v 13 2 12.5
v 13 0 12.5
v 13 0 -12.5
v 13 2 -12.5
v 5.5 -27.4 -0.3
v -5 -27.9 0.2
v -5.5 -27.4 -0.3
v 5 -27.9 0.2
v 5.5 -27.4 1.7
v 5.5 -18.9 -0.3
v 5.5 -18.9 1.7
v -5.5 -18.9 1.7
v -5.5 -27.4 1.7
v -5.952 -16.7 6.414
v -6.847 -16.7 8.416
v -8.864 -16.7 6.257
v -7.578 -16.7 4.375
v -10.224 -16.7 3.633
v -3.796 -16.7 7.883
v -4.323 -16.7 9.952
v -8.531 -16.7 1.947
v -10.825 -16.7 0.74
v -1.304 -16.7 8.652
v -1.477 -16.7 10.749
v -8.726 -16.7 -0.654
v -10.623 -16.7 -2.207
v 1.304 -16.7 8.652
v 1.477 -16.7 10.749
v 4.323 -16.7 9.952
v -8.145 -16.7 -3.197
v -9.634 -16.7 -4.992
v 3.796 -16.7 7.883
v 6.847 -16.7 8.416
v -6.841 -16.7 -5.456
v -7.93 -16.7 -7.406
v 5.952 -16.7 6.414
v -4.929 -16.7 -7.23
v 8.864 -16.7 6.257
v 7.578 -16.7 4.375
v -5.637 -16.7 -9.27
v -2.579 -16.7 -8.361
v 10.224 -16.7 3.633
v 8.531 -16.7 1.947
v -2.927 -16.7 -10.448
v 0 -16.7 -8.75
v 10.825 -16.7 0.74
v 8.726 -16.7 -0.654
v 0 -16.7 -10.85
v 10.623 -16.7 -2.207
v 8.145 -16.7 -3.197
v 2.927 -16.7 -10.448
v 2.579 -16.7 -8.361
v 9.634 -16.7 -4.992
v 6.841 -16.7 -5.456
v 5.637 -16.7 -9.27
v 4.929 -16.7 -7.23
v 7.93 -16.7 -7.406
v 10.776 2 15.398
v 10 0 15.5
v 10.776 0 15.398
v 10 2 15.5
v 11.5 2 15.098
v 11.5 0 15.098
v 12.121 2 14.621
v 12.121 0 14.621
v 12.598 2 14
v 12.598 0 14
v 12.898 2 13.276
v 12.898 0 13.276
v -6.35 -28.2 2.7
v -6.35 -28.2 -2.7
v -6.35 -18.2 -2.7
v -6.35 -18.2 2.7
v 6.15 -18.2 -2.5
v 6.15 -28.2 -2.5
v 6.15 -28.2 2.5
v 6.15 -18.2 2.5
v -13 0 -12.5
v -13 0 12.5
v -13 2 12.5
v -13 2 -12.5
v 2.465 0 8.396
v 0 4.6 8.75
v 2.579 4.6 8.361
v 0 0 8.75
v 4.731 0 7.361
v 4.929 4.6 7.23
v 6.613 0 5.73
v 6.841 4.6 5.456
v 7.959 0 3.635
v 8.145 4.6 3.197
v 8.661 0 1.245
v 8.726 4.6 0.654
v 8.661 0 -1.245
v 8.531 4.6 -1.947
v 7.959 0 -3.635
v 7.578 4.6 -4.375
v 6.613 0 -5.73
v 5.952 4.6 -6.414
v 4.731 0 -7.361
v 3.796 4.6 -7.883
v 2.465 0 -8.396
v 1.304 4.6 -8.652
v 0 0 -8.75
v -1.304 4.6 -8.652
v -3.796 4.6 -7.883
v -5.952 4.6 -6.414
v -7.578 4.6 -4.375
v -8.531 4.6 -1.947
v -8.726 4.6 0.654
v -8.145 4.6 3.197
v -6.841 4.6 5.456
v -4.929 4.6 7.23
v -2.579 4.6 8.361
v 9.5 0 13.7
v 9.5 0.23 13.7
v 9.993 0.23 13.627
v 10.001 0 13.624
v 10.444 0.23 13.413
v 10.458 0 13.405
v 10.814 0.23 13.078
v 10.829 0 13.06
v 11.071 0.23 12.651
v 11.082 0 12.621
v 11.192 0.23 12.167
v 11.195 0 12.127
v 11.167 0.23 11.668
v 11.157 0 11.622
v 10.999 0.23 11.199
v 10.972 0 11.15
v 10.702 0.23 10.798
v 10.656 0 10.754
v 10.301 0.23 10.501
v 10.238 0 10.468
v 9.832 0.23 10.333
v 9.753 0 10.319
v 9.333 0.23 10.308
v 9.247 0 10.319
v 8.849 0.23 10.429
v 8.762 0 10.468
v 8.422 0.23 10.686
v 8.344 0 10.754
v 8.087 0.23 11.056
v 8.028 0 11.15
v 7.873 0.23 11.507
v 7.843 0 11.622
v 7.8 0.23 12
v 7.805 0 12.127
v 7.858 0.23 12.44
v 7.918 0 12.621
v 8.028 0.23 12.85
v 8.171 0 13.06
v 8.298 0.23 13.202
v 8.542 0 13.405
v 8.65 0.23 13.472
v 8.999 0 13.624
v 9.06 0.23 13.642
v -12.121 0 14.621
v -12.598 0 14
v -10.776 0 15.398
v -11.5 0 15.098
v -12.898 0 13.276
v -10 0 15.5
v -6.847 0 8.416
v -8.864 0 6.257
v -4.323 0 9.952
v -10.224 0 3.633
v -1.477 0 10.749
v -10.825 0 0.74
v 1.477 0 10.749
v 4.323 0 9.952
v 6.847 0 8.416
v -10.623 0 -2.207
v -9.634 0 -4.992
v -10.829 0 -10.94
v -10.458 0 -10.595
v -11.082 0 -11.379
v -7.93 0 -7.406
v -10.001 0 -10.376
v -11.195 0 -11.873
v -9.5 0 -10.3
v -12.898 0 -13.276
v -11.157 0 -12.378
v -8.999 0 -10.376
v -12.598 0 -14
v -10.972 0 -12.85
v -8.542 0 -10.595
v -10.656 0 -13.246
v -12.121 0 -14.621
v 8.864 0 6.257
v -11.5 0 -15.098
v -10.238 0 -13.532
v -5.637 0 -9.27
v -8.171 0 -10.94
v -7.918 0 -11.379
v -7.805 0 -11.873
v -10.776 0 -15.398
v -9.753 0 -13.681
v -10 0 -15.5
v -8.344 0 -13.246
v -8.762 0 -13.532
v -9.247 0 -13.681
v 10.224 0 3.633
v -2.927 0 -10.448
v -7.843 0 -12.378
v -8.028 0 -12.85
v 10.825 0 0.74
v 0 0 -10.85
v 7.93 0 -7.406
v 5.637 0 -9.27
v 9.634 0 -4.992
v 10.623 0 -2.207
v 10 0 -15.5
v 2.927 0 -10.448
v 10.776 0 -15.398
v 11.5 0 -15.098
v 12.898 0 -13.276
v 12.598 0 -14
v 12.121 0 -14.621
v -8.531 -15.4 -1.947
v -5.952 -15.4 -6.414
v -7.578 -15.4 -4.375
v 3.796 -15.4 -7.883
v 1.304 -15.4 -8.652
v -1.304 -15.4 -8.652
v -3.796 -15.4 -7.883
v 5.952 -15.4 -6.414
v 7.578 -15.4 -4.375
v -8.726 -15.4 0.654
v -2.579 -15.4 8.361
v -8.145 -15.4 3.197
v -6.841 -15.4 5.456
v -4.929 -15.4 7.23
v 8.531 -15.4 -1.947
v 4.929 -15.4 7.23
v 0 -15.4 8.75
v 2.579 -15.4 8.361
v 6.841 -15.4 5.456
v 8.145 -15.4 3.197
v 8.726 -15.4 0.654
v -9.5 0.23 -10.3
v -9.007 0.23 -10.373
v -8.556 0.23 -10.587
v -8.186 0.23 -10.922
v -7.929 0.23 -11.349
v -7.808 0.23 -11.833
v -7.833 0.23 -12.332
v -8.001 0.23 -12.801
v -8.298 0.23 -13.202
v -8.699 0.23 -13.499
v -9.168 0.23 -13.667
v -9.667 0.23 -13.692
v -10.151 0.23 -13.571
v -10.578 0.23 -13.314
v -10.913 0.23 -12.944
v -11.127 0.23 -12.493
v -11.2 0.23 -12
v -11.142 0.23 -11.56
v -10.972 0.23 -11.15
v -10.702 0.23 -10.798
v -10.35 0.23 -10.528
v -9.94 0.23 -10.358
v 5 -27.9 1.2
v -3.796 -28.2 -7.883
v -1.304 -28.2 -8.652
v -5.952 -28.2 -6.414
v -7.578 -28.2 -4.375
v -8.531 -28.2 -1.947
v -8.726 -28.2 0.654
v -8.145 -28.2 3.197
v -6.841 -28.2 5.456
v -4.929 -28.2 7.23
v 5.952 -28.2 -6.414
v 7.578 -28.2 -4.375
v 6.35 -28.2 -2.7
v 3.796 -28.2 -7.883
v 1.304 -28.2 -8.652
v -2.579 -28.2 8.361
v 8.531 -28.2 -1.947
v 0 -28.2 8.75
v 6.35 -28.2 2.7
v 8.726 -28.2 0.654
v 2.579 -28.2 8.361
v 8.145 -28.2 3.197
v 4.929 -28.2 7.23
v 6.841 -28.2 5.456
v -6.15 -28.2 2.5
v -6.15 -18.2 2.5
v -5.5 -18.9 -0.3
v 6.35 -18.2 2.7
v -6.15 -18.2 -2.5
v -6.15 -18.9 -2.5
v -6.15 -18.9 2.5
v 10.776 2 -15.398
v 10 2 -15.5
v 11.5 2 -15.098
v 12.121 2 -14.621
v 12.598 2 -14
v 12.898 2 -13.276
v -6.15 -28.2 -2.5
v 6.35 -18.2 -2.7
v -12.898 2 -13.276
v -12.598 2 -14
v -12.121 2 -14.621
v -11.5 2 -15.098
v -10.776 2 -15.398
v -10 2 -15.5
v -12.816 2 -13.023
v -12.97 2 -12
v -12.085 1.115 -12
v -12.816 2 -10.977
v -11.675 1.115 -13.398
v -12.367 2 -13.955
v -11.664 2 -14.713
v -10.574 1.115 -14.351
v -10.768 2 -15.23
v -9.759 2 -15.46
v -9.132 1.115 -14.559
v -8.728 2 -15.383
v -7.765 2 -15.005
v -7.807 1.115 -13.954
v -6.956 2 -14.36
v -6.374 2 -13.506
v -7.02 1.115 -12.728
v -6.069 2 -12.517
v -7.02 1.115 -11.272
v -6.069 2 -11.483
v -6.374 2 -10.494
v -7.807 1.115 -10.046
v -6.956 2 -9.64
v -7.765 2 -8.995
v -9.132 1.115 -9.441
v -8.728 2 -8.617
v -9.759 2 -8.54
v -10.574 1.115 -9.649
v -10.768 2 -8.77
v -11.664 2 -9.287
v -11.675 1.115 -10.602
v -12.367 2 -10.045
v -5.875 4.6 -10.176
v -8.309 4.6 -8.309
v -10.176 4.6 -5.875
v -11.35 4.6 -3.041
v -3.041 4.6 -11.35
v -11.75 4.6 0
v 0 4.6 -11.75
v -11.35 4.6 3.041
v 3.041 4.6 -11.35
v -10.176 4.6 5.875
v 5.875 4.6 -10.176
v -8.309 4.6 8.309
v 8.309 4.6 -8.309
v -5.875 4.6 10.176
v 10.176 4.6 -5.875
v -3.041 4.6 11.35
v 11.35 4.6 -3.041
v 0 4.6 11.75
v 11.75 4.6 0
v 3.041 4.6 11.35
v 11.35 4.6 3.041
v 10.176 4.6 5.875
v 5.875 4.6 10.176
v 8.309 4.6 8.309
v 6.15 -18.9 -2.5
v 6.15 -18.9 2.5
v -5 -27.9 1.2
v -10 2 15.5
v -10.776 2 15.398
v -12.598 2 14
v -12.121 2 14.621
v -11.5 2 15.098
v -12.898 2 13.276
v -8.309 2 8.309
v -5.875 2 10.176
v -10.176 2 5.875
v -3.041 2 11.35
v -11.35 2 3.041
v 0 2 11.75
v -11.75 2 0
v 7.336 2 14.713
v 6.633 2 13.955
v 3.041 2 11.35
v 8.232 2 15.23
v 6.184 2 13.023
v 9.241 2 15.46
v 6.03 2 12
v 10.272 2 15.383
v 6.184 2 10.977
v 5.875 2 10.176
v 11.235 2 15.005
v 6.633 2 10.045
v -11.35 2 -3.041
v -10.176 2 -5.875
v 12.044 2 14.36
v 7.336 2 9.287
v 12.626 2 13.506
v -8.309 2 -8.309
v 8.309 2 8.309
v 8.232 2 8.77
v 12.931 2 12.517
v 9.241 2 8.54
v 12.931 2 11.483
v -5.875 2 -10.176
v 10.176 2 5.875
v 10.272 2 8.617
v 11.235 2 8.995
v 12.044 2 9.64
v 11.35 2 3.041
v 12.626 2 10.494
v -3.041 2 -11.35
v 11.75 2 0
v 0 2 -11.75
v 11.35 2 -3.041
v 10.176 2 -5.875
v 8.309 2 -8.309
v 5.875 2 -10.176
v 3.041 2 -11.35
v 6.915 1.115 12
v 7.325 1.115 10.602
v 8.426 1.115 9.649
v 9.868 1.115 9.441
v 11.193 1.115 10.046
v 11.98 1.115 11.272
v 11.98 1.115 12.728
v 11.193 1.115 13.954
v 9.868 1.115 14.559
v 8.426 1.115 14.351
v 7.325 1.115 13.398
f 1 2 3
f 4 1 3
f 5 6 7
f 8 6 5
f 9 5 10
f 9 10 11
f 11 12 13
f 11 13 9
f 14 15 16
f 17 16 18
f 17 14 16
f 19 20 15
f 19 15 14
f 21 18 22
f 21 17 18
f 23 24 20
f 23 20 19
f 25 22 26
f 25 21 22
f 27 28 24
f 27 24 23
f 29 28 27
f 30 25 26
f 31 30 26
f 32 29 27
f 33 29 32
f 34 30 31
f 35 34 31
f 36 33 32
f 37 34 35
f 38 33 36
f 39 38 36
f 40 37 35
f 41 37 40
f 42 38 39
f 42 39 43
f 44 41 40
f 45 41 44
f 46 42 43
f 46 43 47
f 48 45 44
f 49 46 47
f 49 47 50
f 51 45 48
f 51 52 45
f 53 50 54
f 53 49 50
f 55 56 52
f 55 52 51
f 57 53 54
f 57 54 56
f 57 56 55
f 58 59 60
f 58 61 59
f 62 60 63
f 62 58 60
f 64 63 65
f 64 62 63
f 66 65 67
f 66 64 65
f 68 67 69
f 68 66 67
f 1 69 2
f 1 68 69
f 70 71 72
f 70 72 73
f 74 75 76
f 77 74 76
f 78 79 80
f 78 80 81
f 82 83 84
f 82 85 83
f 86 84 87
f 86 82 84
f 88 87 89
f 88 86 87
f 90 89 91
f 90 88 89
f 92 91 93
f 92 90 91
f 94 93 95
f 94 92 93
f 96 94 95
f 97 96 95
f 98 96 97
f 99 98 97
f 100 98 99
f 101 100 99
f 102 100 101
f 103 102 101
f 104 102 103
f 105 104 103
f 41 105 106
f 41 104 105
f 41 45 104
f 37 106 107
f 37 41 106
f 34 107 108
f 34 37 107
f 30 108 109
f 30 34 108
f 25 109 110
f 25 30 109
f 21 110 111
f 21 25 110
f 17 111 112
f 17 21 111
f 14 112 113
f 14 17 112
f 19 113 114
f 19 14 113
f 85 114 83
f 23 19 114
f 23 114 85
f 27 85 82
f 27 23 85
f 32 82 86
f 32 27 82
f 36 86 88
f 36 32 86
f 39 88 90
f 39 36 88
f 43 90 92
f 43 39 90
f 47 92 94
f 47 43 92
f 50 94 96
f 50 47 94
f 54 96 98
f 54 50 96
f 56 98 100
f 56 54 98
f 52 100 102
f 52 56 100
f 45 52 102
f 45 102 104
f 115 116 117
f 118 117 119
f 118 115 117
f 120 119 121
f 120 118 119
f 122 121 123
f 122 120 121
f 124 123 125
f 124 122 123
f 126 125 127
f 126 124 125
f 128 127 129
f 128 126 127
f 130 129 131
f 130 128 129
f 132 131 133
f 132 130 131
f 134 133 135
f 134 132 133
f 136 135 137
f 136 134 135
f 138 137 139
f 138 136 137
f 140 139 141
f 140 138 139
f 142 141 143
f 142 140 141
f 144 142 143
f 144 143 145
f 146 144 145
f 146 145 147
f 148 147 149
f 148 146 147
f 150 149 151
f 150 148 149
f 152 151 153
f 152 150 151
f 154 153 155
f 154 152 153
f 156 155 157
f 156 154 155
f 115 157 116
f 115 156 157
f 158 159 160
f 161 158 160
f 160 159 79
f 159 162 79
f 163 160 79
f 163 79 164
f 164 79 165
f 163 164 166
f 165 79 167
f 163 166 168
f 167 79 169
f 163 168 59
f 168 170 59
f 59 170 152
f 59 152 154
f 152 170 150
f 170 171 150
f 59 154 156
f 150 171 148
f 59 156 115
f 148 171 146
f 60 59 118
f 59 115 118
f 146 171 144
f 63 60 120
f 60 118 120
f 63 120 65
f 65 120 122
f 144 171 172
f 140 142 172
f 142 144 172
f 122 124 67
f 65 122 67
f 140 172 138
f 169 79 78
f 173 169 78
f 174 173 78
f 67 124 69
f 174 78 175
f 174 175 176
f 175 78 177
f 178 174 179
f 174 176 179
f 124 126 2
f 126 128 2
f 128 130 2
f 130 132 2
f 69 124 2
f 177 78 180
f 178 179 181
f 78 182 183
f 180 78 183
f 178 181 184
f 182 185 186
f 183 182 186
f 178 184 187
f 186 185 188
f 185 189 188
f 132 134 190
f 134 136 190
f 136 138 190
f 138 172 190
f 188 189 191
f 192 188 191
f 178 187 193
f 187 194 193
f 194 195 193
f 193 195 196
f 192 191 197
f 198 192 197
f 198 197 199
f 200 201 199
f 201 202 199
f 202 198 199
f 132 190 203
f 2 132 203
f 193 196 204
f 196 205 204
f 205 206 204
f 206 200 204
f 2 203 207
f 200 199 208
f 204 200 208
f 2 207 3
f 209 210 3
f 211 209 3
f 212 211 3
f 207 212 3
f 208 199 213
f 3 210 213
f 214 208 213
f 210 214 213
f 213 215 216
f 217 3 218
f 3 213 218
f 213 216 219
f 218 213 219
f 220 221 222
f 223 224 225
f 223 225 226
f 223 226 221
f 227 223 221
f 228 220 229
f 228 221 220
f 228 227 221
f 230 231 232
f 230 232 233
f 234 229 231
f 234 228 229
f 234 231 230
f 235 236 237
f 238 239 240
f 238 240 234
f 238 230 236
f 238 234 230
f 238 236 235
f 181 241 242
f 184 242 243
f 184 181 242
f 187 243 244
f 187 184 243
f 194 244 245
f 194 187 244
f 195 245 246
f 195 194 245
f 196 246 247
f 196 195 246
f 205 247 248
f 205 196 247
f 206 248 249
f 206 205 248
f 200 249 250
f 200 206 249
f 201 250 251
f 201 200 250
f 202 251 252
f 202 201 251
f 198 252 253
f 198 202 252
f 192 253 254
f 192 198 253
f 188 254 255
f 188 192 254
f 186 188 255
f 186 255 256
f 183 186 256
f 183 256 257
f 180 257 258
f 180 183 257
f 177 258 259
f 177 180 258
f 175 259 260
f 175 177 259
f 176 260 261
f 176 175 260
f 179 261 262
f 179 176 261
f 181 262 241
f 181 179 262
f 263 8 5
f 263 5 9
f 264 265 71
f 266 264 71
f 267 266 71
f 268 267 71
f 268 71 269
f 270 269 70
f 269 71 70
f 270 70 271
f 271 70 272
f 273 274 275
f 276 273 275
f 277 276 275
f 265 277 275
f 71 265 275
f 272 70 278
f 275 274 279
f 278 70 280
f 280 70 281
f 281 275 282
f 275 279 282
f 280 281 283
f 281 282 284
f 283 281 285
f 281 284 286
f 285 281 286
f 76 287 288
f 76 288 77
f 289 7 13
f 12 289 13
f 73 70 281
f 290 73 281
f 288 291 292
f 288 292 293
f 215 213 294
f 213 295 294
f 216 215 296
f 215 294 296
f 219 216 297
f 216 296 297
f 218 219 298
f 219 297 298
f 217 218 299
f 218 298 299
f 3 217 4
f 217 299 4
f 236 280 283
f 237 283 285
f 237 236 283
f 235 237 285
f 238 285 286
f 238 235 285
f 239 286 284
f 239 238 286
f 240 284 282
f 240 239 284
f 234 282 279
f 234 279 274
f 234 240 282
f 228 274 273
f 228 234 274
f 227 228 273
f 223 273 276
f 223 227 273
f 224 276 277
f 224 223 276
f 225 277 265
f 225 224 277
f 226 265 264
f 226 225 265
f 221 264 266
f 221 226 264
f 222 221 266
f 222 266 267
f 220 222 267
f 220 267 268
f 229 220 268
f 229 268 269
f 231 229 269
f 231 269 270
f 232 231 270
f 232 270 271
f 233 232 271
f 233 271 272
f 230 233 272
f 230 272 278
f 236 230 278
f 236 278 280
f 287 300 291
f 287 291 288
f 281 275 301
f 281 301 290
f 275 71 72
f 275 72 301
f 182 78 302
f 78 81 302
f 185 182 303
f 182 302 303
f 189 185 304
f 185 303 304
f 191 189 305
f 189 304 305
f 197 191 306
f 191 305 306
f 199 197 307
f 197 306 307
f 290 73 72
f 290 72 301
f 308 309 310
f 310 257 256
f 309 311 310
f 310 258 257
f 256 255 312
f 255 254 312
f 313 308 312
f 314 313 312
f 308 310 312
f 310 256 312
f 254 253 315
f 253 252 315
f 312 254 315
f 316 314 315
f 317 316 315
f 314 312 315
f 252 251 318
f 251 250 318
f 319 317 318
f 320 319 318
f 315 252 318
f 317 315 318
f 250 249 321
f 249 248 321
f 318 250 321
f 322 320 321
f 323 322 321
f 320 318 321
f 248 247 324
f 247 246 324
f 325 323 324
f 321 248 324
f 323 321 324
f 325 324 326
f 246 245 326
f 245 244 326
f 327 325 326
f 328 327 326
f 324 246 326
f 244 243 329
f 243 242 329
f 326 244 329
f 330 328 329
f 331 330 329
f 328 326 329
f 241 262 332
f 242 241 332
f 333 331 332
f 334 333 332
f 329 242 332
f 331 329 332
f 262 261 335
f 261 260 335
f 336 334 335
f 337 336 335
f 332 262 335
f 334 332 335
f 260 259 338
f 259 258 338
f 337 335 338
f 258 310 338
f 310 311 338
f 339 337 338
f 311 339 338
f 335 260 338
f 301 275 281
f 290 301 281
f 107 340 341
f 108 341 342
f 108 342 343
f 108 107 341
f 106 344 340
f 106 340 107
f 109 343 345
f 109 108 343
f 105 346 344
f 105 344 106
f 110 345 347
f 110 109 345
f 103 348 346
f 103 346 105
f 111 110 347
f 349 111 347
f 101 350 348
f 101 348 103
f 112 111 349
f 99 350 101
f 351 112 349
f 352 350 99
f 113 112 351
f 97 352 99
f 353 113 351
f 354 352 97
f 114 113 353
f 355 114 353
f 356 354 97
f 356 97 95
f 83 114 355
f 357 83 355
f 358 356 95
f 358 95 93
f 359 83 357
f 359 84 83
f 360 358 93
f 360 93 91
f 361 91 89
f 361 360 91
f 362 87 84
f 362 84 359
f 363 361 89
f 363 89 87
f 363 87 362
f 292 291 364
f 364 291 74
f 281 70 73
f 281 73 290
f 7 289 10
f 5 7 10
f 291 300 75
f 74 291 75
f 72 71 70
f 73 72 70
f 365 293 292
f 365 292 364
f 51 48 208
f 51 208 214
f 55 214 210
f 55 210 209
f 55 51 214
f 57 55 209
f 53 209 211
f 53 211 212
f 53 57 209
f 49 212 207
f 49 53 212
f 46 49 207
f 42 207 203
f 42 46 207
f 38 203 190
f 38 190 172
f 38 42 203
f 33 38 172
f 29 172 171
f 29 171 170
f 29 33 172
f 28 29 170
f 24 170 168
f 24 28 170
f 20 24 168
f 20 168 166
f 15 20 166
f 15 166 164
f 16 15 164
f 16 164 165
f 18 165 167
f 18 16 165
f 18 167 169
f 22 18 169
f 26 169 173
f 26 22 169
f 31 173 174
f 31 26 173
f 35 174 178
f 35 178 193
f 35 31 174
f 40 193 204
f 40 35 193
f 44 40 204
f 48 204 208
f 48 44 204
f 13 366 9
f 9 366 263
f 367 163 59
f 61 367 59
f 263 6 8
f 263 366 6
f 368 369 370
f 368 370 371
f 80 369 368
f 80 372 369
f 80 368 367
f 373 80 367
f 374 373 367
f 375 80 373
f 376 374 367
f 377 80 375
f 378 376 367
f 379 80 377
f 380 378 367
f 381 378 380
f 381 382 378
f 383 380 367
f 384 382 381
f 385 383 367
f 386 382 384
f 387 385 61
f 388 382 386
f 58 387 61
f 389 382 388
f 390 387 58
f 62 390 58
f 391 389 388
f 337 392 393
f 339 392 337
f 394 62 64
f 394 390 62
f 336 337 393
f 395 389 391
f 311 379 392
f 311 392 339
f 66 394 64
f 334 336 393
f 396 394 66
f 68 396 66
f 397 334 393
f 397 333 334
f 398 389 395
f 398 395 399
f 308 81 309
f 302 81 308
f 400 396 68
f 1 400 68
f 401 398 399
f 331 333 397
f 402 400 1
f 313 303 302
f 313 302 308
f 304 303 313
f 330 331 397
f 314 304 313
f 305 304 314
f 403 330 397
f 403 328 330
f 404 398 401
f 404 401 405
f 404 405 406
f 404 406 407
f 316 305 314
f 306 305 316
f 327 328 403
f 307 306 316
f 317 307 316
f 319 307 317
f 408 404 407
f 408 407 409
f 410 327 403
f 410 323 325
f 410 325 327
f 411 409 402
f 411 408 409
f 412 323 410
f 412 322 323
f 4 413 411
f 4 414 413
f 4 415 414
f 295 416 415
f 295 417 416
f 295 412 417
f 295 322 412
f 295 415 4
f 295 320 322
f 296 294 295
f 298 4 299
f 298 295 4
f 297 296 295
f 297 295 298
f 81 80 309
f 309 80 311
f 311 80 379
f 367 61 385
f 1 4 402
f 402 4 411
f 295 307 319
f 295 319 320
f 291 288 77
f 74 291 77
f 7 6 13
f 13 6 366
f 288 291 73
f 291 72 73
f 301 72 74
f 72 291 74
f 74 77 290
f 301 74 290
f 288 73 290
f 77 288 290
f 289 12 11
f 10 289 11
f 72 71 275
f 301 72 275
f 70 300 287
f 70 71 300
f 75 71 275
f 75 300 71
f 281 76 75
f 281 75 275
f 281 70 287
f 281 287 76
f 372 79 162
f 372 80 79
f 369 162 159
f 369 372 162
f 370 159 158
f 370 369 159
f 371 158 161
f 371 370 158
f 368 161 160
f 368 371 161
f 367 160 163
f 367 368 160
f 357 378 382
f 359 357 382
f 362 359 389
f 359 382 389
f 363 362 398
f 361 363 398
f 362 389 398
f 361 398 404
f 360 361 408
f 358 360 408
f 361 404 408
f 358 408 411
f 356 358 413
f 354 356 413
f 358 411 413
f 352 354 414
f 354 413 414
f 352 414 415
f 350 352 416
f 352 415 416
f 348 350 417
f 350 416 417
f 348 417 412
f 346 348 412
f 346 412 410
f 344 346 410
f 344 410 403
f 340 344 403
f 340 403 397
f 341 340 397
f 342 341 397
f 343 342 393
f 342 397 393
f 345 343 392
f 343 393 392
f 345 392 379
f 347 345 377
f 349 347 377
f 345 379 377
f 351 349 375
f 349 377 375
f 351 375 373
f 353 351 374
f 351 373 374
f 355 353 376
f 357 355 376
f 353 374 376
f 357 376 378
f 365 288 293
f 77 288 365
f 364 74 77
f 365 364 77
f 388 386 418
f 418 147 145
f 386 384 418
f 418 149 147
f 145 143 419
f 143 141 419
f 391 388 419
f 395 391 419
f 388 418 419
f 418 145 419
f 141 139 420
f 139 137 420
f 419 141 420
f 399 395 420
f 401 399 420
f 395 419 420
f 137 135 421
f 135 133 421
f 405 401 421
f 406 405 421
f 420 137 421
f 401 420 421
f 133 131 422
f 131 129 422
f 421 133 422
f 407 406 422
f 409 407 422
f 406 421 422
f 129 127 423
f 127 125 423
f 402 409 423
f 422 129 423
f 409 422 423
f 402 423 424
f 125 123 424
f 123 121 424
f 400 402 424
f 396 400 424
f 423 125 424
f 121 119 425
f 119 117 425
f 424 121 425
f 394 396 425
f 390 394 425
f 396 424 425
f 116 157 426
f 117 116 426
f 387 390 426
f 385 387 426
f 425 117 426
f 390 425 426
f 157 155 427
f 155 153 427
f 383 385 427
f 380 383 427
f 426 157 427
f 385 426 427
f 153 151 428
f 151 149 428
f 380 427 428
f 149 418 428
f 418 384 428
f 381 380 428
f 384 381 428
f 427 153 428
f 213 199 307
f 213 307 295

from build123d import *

# Parameters (mm, degrees)
CROQUIS1_W                                           = 26
CROQUIS1_H                                           = 31
CROQUIS1_R                                           = 8.75
CROQUIS1_R_2                                         = 1.7
SALIENTE_EXTRUIR1_DEPTH                              = 2
REDONDEO1_R                                          = 3
CROQUIS2_R                                           = 11.75
CROQUIS2_R_2                                         = 8.75
SALIENTE_EXTRUIR2_DEPTH                              = 2.6
SALIENTE_EXTRUIR3_START                              = 16.7
CROQUIS3_R                                           = 10.85
CROQUIS3_R_2                                         = 8.75
SALIENTE_EXTRUIR3_DEPTH                              = 16.7
AVELLANADO_PARA_TORNILLOS_CON_CABEZA_AVE_D           = 3.4
AVELLANADO_PARA_TORNILLOS_CON_CABEZA_AVE_DEPTH       = 15
AVELLANADO_PARA_TORNILLOS_CON_CABEZA_AVE_CSINK_D     = 6.94
AVELLANADO_PARA_TORNILLOS_CON_CABEZA_AVE_CSINK_ANGLE = 90
AVELLANADO_PARA_TORNILLOS_CON_CABEZA_AVE_TIP         = 1.021463052
CROQUIS6_R                                           = 8.75
SALIENTE_EXTRUIR4_DEPTH                              = 32.8
CROQUIS7_W                                           = 12.7
CROQUIS7_H                                           = 5.4
CORTAR_EXTRUIR1_DEPTH                                = 10
CROQUIS8_W                                           = 12.7
CROQUIS8_H                                           = 5.4
CORTAR_EXTRUIR2_DEPTH                                = 10
CROQUIS9_W                                           = 12.7
CROQUIS9_H                                           = 5.4
CROQUIS9_W_2                                         = 12.3
CROQUIS9_H_2                                         = 5
SALIENTE_EXTRUIR5_DEPTH                              = 10
CROQUIS10_W                                          = 12.7
CROQUIS10_H                                          = 5.4
CROQUIS10_W_2                                        = 12.3
CROQUIS10_H_2                                        = 5
SALIENTE_EXTRUIR6_DEPTH                              = 10
CROQUIS11_W                                          = 12.3
CROQUIS11_H                                          = 5
SALIENTE_EXTRUIR7_DEPTH                              = 0.7
CROQUIS12_W                                          = 12.3
CROQUIS12_H                                          = 5
SALIENTE_EXTRUIR8_DEPTH                              = 0.7
CROQUIS13_W                                          = 11
CROQUIS13_H                                          = 2
SALIENTE_EXTRUIR9_DEPTH                              = 9
CROQUIS14_W                                          = 11
CROQUIS14_H                                          = 2
SALIENTE_EXTRUIR10_DEPTH                             = 9
CHAFL_N1_SIZE                                        = 0.5
CHAFL_N2_SIZE                                        = 0.5
CUT_EXTRUDE1_START                                   = -20
SKETCH1_R                                            = 8.75
CUT_EXTRUDE1_DEPTH                                   = 20


with BuildPart() as part:
    # Croquis1 → Saliente-Extruir1 (new body)
    with BuildSketch(Plane(origin=(0, 0, 0), x_dir=(1, 0, 0), z_dir=(0, 1, 0))):
        Rectangle(CROQUIS1_W, CROQUIS1_H)
        with Locations(Location((0, 0, 0), (0, 0, 270))):
            Circle(CROQUIS1_R, mode=Mode.SUBTRACT)
        with Locations(Location((-9.5, 12, 0), (0, 0, 270))):
            Circle(CROQUIS1_R_2, mode=Mode.SUBTRACT)
        with Locations(Location((9.5, -12, 0), (0, 0, 270))):
            Circle(CROQUIS1_R_2, mode=Mode.SUBTRACT)
    extrude(amount=SALIENTE_EXTRUIR1_DEPTH)

    # Redondeo1
    redondeo1_edges = [part.edges().sort_by_distance(p)[0] for p in [
        (13, 1, 15.5),
        (-13, 1, 15.5),
        (-13, 1, -15.5),
        (13, 1, -15.5),
    ]]
    fillet(redondeo1_edges, radius=REDONDEO1_R)

    # Croquis2 → Saliente-Extruir2 (add)
    with BuildSketch(Plane(origin=(0, 2, 0), x_dir=(1, 0, 0), z_dir=(0, 1, 0))):
        with Locations(Location((0, 0, 0), (0, 0, 270))):
            Circle(CROQUIS2_R)
        with Locations(Location((0, 0, 0), (0, 0, 270))):
            Circle(CROQUIS2_R_2, mode=Mode.SUBTRACT)
    extrude(amount=SALIENTE_EXTRUIR2_DEPTH)

    # Croquis3 → Saliente-Extruir3 (add)
    with BuildSketch(Plane.XZ.offset(SALIENTE_EXTRUIR3_START)):
        with Locations(Location((0, 0, 0), (0, 0, 270))):
            Circle(CROQUIS3_R)
        with Locations(Location((0, 0, 0), (0, 0, 270))):
            Circle(CROQUIS3_R_2, mode=Mode.SUBTRACT)
    extrude(amount=-SALIENTE_EXTRUIR3_DEPTH)

    # Avellanado para tornillos con cabeza avellanada de clavija de M31
    with Locations(Plane(origin=(0, 2, 0), x_dir=(1, 0, 0), z_dir=(0, 1, 0))):
        with Locations((9.5, -12), (-9.5, 12)):
            CounterSinkHole(AVELLANADO_PARA_TORNILLOS_CON_CABEZA_AVE_D / 2, AVELLANADO_PARA_TORNILLOS_CON_CABEZA_AVE_CSINK_D / 2, depth=AVELLANADO_PARA_TORNILLOS_CON_CABEZA_AVE_DEPTH, counter_sink_angle=AVELLANADO_PARA_TORNILLOS_CON_CABEZA_AVE_CSINK_ANGLE)
            with Locations((0, 0, -(AVELLANADO_PARA_TORNILLOS_CON_CABEZA_AVE_DEPTH + AVELLANADO_PARA_TORNILLOS_CON_CABEZA_AVE_TIP / 2))):  # 118° drill point
                Cone(0, AVELLANADO_PARA_TORNILLOS_CON_CABEZA_AVE_D / 2, AVELLANADO_PARA_TORNILLOS_CON_CABEZA_AVE_TIP, mode=Mode.SUBTRACT)


with BuildPart() as body_2:
    # Croquis6 → Saliente-Extruir4 (new body)
    with BuildSketch(Plane(origin=(0, 4.6, 0), x_dir=(1, 0, 0), z_dir=(0, 1, 0))):
        with Locations(Location((0, 0, 0), (0, 0, 270))):
            Circle(CROQUIS6_R)
    extrude(amount=-SALIENTE_EXTRUIR4_DEPTH)

    # Croquis7 → Cortar-Extruir1 (cut)
    with BuildSketch(Plane(origin=(0, 4.6, 0), x_dir=(1, 0, 0), z_dir=(0, 1, 0))):
        Rectangle(CROQUIS7_W, CROQUIS7_H)
    extrude(amount=-CORTAR_EXTRUIR1_DEPTH, mode=Mode.SUBTRACT)

    # Croquis8 → Cortar-Extruir2 (cut)
    with BuildSketch(Plane.XZ.offset(28.2)):
        Rectangle(CROQUIS8_W, CROQUIS8_H)
    extrude(amount=-CORTAR_EXTRUIR2_DEPTH, mode=Mode.SUBTRACT)


with BuildPart() as body_3:
    # Croquis9 → Saliente-Extruir5 (new body)
    with BuildSketch(Plane.XZ.offset(28.2)):
        Rectangle(CROQUIS9_W, CROQUIS9_H)
        Rectangle(CROQUIS9_W_2, CROQUIS9_H_2, mode=Mode.SUBTRACT)
    extrude(amount=-SALIENTE_EXTRUIR5_DEPTH)


with BuildPart() as body_4:
    # Croquis10 → Saliente-Extruir6 (new body)
    with BuildSketch(Plane(origin=(0, 4.6, 0), x_dir=(1, 0, 0), z_dir=(0, 1, 0))):
        Rectangle(CROQUIS10_W, CROQUIS10_H)
        Rectangle(CROQUIS10_W_2, CROQUIS10_H_2, mode=Mode.SUBTRACT)
    extrude(amount=-SALIENTE_EXTRUIR6_DEPTH)


with BuildPart() as body_5:
    # Croquis11 → Saliente-Extruir7 (new body)
    with BuildSketch(Plane(origin=(0, -5.4, 0), x_dir=(1, 0, 0), z_dir=(0, 1, 0))):
        Rectangle(CROQUIS11_W, CROQUIS11_H)
    extrude(amount=SALIENTE_EXTRUIR7_DEPTH)


with BuildPart() as body_6:
    # Croquis12 → Saliente-Extruir8 (new body)
    with BuildSketch(Plane.XZ.offset(18.2)):
        Rectangle(CROQUIS12_W, CROQUIS12_H)
    extrude(amount=SALIENTE_EXTRUIR8_DEPTH)


with BuildPart() as body_7:
    # Croquis13 → Saliente-Extruir9 (new body)
    with BuildSketch(Plane(origin=(0, -4.7, 0), x_dir=(1, 0, 0), z_dir=(0, 1, 0))):
        with Locations((0, -0.7)):
            Rectangle(CROQUIS13_W, CROQUIS13_H)
    extrude(amount=SALIENTE_EXTRUIR9_DEPTH)

    # Chaflán1
    chafl_n1_edges = [body_7.edges().sort_by_distance(p)[0] for p in [
        (-5.5, 4.3, 0.7),
        (0, 4.3, 1.7),
        (5.5, 4.3, 0.7),
        (0, 4.3, -0.3),
    ]]
    chamfer(chafl_n1_edges, length=CHAFL_N1_SIZE)


with BuildPart() as body_8:
    # Croquis14 → Saliente-Extruir10 (new body)
    with BuildSketch(Plane.XZ.offset(18.9)):
        with Locations((0, 0.7)):
            Rectangle(CROQUIS14_W, CROQUIS14_H)
    extrude(amount=SALIENTE_EXTRUIR10_DEPTH)

    # Chaflán2
    chafl_n2_edges = [body_8.edges().sort_by_distance(p)[0] for p in [
        (0, -27.9, -0.3),
        (5.5, -27.9, 0.7),
        (0, -27.9, 1.7),
        (-5.5, -27.9, 0.7),
    ]]
    chamfer(chafl_n2_edges, length=CHAFL_N2_SIZE)


with BuildPart() as cut_extrude1_tool:
    # Sketch1 → Cut-Extrude1 (new body)
    with BuildSketch(Plane(origin=(0, 4.6, 0), x_dir=(1, 0, 0), z_dir=(0, 1, 0)).offset(CUT_EXTRUDE1_START)):
        with Locations(Location((0, 0, 0), (0, 0, 270))):
            Circle(SKETCH1_R)
    extrude(amount=CUT_EXTRUDE1_DEPTH)


with BuildPart() as body_2_1:
    add(body_2.part)

    # Cut-Extrude1: cut by cut_extrude1_tool
    add(cut_extrude1_tool.part, mode=Mode.SUBTRACT)


with BuildPart() as body_4_1:
    add(body_4.part)

    # Cut-Extrude1: cut by cut_extrude1_tool
    add(cut_extrude1_tool.part, mode=Mode.SUBTRACT)


with BuildPart() as body_5_1:
    add(body_5.part)

    # Cut-Extrude1: cut by cut_extrude1_tool
    add(cut_extrude1_tool.part, mode=Mode.SUBTRACT)


with BuildPart() as body_7_1:
    add(body_7.part)

    # Cut-Extrude1: cut by cut_extrude1_tool
    add(cut_extrude1_tool.part, mode=Mode.SUBTRACT)


solid = Compound([part.part, body_3.part, body_6.part, body_8.part, body_2_1.part])
